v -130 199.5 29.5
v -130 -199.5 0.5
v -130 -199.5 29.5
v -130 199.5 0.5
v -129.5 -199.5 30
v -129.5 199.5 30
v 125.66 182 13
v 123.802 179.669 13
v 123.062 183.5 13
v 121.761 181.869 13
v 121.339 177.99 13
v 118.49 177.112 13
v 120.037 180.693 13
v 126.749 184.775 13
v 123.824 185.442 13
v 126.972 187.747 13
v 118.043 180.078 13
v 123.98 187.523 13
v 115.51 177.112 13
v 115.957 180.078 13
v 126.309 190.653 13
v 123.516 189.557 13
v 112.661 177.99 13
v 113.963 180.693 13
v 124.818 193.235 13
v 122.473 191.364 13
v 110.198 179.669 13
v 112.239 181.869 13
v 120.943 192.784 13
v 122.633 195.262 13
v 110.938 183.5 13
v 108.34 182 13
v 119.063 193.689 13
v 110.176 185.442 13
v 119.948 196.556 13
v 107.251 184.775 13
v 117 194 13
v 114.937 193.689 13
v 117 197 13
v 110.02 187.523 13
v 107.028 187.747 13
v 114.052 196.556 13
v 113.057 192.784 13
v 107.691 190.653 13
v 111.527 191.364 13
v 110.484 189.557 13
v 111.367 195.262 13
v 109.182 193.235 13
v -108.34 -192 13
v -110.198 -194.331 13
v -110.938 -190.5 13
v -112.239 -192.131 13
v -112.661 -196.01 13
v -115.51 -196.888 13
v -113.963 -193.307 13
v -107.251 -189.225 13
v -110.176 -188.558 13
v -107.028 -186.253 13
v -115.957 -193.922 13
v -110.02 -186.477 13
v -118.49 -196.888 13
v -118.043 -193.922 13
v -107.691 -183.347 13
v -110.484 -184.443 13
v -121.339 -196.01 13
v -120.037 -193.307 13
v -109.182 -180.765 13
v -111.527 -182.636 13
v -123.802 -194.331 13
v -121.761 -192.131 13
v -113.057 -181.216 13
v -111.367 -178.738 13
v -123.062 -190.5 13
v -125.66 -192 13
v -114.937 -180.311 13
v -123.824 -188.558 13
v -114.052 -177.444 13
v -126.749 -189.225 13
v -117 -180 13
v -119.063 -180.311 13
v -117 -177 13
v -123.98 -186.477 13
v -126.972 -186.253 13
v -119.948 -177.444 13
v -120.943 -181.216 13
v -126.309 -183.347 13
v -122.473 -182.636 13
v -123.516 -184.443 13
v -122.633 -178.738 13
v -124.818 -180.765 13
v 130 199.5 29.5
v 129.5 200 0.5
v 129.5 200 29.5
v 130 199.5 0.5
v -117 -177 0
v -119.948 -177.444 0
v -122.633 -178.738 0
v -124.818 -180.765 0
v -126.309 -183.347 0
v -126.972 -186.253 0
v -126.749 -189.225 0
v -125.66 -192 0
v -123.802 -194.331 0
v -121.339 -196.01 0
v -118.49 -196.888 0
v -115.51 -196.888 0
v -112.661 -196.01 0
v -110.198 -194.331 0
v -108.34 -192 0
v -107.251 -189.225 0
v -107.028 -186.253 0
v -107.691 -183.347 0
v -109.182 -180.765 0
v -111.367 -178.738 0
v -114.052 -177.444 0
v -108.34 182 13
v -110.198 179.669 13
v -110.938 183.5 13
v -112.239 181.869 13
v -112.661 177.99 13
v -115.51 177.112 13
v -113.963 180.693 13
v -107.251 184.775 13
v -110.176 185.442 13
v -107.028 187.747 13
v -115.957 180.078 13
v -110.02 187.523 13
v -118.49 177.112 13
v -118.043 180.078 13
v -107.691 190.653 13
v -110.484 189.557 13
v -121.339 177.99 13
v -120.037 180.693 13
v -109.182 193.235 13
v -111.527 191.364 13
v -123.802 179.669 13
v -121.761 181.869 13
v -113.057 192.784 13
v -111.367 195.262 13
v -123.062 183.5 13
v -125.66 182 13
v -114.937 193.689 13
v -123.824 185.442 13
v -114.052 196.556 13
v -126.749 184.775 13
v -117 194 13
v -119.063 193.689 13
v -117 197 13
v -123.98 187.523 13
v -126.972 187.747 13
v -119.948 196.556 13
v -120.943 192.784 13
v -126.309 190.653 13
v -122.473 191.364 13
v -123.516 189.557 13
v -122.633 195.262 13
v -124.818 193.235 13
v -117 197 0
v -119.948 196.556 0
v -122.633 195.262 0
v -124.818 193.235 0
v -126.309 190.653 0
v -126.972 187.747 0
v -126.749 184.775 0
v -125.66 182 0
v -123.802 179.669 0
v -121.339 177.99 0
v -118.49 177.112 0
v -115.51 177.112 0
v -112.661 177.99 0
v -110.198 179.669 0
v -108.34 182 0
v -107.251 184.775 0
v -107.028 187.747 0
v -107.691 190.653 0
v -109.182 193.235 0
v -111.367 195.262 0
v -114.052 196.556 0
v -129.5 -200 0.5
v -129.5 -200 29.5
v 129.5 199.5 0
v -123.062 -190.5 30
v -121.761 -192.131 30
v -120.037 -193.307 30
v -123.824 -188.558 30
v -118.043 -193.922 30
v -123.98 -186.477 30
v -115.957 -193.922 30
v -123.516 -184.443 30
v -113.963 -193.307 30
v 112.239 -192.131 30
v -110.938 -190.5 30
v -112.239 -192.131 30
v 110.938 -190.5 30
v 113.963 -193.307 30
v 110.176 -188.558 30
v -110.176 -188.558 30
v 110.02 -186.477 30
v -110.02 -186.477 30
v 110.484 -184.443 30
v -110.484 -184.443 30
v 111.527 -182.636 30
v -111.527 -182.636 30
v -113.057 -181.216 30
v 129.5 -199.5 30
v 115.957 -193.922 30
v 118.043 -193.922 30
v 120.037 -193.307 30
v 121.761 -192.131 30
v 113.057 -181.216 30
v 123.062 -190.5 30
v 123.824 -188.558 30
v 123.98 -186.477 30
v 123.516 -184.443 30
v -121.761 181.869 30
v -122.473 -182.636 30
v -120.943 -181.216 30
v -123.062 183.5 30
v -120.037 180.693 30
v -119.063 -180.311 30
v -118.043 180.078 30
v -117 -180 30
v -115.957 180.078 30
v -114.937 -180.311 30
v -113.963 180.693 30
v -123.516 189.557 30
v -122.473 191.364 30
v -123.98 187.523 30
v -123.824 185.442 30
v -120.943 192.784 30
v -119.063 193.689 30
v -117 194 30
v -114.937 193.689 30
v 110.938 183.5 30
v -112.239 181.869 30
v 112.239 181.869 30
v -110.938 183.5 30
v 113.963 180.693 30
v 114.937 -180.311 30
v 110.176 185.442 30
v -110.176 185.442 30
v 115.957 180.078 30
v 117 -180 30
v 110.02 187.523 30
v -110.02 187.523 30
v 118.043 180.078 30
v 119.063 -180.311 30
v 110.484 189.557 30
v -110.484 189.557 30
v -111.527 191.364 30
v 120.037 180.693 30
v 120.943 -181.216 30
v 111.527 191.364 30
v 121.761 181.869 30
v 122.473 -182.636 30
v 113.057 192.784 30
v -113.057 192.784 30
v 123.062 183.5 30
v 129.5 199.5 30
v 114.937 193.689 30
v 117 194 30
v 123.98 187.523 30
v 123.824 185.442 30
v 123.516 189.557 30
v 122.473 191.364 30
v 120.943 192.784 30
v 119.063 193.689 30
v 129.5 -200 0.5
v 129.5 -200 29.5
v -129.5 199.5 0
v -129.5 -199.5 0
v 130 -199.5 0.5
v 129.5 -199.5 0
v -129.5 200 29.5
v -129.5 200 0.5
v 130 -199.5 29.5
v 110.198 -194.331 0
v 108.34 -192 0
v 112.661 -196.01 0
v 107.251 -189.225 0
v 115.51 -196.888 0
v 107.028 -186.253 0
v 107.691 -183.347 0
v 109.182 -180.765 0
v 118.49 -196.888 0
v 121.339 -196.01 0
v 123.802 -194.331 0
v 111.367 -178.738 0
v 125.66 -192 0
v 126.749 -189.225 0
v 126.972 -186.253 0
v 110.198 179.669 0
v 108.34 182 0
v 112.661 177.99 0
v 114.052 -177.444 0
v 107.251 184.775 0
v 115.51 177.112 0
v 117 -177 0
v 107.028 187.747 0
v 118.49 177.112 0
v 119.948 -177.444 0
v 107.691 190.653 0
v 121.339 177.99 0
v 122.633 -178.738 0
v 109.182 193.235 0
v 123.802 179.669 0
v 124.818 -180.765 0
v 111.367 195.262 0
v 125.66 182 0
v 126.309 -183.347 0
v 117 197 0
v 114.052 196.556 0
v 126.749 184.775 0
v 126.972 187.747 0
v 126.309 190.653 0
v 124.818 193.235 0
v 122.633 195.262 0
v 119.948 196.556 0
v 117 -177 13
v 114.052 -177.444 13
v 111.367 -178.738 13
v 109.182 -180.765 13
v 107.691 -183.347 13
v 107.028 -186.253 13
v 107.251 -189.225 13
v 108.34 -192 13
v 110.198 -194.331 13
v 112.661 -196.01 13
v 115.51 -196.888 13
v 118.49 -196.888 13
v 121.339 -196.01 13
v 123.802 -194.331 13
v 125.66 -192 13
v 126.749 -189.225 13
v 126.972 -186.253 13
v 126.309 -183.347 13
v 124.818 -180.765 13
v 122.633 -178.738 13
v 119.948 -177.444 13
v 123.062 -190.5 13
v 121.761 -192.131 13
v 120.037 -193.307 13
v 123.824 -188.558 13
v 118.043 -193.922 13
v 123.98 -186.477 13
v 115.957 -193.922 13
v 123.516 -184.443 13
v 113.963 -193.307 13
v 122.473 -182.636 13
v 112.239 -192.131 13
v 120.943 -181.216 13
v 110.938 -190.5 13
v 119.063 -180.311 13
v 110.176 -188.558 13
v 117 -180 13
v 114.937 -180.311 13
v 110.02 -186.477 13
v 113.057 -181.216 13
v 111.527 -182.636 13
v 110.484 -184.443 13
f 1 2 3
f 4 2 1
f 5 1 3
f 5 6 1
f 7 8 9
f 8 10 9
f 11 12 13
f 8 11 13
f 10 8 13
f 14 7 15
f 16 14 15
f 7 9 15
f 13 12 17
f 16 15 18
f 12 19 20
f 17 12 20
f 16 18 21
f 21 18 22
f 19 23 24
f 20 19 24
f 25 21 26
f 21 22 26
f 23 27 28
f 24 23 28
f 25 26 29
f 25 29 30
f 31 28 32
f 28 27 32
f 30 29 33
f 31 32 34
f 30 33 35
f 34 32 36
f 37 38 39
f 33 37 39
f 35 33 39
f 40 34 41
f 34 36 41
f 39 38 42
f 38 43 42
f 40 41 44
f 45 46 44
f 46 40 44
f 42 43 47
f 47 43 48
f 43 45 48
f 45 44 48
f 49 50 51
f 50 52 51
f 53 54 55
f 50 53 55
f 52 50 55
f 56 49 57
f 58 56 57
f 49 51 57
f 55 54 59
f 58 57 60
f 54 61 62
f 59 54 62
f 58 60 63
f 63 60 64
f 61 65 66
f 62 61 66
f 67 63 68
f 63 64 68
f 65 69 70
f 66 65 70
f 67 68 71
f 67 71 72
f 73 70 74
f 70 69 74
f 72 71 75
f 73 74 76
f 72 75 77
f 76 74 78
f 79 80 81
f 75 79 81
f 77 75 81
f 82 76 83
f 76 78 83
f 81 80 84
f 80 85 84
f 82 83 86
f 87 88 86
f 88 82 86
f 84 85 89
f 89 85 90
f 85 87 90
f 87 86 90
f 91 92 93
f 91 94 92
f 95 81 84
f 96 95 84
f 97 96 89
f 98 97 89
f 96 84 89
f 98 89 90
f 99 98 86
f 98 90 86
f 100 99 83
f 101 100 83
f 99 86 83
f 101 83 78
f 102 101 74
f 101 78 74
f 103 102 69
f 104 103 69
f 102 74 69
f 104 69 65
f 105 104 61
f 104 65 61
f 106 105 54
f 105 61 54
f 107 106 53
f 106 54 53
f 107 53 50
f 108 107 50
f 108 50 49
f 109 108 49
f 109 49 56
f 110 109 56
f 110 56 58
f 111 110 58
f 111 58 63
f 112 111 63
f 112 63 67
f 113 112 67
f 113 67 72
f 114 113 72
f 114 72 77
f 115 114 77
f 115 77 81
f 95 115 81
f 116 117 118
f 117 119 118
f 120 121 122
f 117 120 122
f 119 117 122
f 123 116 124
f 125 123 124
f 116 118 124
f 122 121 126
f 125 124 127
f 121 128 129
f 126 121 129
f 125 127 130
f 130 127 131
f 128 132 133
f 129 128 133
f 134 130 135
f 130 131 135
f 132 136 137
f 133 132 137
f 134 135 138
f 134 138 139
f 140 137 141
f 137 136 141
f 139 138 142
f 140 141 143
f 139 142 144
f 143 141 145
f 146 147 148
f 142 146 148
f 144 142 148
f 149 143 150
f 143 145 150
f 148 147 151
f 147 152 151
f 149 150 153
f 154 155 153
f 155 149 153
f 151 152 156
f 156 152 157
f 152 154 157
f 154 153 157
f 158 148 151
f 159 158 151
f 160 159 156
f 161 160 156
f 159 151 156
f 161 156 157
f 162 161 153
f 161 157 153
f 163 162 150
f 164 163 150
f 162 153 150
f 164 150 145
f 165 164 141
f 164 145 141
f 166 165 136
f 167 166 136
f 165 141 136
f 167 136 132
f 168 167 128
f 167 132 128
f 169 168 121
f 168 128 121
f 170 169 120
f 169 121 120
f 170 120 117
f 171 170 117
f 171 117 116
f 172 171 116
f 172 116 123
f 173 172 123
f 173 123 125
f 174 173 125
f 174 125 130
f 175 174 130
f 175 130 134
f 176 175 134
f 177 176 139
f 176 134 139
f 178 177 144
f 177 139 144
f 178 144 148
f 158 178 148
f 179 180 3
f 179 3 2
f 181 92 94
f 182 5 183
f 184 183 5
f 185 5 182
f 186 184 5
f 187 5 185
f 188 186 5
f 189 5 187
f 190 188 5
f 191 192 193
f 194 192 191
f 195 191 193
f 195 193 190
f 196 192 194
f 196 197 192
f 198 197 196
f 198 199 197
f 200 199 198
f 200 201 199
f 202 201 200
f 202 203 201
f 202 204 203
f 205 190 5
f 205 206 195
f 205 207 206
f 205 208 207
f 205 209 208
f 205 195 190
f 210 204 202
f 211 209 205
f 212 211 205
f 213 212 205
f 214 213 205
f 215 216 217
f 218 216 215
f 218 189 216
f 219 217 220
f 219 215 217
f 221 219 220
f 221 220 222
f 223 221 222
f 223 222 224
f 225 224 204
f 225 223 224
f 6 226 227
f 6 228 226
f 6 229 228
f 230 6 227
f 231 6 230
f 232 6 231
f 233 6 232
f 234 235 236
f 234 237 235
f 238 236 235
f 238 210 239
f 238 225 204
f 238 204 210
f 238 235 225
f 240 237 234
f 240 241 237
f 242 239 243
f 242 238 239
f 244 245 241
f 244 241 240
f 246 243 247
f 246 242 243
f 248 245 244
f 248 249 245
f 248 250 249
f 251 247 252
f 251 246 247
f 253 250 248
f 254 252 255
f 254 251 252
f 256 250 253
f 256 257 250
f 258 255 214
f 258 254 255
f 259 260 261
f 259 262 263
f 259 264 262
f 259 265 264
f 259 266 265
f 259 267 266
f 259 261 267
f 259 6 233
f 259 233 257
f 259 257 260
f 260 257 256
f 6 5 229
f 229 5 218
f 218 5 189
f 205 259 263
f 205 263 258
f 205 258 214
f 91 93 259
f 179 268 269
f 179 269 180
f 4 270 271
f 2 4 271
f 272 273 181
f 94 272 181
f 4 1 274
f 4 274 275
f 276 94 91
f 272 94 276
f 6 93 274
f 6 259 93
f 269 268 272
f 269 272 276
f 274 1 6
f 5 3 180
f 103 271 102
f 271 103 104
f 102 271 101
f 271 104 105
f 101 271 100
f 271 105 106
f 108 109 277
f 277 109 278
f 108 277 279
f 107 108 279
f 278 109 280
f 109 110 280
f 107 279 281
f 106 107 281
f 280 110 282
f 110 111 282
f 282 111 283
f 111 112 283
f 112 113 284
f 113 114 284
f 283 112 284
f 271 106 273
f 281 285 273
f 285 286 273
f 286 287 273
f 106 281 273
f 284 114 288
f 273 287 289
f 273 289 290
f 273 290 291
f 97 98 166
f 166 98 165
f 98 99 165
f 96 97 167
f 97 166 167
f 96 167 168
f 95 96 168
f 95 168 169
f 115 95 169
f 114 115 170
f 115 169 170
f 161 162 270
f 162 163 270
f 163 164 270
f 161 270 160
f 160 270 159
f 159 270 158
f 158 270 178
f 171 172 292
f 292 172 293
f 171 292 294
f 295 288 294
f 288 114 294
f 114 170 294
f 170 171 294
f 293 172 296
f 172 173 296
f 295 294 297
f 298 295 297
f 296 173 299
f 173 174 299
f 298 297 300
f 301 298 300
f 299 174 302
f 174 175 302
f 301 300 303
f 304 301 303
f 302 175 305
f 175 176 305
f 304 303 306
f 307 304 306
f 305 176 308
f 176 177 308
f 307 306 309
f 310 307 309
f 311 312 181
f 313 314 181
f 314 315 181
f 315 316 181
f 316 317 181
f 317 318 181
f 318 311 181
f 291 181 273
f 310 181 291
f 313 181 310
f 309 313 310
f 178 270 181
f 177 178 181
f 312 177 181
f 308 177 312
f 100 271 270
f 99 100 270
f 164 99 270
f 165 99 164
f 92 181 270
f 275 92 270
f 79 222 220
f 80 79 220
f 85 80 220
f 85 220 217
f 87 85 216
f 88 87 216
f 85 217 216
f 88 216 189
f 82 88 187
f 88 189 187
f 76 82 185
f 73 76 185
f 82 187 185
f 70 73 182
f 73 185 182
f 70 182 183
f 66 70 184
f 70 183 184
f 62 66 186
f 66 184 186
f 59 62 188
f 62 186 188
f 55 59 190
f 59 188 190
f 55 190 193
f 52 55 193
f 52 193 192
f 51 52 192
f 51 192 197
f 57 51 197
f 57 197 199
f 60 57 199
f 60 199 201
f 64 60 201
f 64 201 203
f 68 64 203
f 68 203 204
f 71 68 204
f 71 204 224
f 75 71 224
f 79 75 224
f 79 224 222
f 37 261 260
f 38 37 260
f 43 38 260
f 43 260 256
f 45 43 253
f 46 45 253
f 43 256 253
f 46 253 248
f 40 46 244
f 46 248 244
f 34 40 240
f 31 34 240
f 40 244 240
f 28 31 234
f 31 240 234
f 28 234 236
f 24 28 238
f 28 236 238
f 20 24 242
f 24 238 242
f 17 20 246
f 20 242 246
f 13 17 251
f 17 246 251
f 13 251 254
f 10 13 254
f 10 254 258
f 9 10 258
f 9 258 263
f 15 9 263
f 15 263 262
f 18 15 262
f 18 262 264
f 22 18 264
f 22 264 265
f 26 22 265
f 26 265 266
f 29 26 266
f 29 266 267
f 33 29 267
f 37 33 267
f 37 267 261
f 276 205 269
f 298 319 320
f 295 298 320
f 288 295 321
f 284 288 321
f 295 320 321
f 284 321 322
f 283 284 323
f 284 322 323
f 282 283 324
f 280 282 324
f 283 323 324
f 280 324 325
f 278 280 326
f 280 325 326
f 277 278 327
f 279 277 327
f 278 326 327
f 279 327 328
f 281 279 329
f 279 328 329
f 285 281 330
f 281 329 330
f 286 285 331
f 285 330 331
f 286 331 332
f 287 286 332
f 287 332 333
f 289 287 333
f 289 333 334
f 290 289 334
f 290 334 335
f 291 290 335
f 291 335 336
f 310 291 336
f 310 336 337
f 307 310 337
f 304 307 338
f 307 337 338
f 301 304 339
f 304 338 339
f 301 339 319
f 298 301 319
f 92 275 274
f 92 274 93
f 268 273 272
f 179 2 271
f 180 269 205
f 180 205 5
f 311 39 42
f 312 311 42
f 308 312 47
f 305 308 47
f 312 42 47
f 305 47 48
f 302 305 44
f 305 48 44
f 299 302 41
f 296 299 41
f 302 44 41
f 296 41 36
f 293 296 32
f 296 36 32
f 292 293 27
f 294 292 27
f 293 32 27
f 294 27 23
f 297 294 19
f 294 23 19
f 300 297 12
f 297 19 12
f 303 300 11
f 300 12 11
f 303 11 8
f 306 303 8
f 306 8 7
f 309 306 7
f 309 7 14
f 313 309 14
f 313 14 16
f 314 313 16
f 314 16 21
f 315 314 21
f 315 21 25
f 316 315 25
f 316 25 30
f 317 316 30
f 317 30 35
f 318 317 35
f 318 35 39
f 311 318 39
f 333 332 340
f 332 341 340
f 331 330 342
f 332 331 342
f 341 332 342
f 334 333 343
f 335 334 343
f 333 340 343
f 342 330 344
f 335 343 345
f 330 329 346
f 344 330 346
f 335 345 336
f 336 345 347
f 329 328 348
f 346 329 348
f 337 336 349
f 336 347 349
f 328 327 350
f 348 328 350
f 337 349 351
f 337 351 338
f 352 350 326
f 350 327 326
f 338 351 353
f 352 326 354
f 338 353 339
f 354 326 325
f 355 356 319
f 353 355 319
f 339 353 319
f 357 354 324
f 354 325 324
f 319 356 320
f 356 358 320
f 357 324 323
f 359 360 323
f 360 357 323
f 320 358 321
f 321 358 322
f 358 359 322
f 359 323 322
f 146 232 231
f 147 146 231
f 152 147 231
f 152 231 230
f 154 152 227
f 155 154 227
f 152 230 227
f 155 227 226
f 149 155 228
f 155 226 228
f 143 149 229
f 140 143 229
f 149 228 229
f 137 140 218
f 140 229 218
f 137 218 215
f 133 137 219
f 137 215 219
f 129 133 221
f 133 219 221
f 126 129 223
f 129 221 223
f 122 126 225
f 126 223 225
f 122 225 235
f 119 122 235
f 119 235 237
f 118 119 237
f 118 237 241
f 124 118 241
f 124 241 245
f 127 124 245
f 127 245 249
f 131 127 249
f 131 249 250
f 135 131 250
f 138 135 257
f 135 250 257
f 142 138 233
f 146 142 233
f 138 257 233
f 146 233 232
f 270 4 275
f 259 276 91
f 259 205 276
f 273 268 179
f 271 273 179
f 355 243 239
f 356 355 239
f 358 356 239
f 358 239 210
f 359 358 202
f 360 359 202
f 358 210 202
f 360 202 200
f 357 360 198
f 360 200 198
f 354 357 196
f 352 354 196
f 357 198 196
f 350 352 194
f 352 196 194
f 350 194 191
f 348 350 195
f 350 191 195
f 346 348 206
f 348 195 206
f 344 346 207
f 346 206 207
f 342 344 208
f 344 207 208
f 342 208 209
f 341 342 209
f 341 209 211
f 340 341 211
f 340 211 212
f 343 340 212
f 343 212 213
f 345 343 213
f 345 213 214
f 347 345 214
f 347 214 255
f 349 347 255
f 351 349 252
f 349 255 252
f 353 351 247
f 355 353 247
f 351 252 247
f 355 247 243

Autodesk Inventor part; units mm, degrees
ref_plane "YZ Plane" through (0, 0, 0) normal (1, 0, 0) x (0, 1, 0)
ref_plane "XZ Plane" through (0, 0, 0) normal (0, 1, 0) x (-1, 0, 0)
ref_plane "XY Plane" through (0, 0, 0) normal (0, 0, 1) x (1, 0, 0)
sketch "Sketch1" plane through (0, 0, 0) normal (0, 0, 1) x (1, 0, 0)
  line L0 (-130, 200) -> (130, 200)
  line L1 (130, 200) -> (130, -200)
  line L2 (130, -200) -> (-130, -200)
  line L3 (-130, -200) -> (-130, 200)
  point P0 (0, 0)
  point P1 (-130, 0)
  point P2 (0, 200)
  point P3 (-117, 187)
  dimension "d74" = 117
  dimension "d75" = 187
  dimension "d92" = 260
  dimension "d93" = 400
extrude "Extrusion1" add sketch "Sketch1" along normal blind 30
hole "Hole1" at (-117, 187, 0) direction (0, 0, 1) diameter 14 depth 30 counterbore diameter 20 counterbore depth 13
pattern_linear "Rectangular Pattern1" count 2 spacing 374 along (0, -1, 0) count 2 spacing 234 along (1, 0, 0) of "Hole1"
chamfer "Chamfer1" distance 0.5 angle 45 12 edges at (-130, 0, 30) (-130, -200, 15) (-130, 0, 0) (-130, 200, 15) (0, 200, 30) (0, 200, 0) (130, 200, 15) (130, 0, 0) (130, 0, 30) (0, -200, 30) (0, -200, 0) (130, -200, 15)
equation "\"d74\" = 0.5 * S2_W"
equation "\"d75\" = 0.5 * S2_L"
equation "\"d92\" = W_"
equation "\"d93\" = L"
equation "\"d20\" = H_"
equation "\"d76\" = S2_d1"
equation "\"d78\" = S2_d2"
equation "\"d79\" = S2_k"
equation "\"d81\" = H_"
equation "\"L\" = 400"
equation "\"W_\" = 260"
equation "\"H_\" = 30"
equation "\"S2_W\" = 234"
equation "\"S2_d1\" = 14"
equation "\"S2_d2\" = 20"
equation "\"S2_k\" = 13"
equation "\"S2_L\" = 374"
properties part number "SA-EP-400x260x30" material "S 55 C"
